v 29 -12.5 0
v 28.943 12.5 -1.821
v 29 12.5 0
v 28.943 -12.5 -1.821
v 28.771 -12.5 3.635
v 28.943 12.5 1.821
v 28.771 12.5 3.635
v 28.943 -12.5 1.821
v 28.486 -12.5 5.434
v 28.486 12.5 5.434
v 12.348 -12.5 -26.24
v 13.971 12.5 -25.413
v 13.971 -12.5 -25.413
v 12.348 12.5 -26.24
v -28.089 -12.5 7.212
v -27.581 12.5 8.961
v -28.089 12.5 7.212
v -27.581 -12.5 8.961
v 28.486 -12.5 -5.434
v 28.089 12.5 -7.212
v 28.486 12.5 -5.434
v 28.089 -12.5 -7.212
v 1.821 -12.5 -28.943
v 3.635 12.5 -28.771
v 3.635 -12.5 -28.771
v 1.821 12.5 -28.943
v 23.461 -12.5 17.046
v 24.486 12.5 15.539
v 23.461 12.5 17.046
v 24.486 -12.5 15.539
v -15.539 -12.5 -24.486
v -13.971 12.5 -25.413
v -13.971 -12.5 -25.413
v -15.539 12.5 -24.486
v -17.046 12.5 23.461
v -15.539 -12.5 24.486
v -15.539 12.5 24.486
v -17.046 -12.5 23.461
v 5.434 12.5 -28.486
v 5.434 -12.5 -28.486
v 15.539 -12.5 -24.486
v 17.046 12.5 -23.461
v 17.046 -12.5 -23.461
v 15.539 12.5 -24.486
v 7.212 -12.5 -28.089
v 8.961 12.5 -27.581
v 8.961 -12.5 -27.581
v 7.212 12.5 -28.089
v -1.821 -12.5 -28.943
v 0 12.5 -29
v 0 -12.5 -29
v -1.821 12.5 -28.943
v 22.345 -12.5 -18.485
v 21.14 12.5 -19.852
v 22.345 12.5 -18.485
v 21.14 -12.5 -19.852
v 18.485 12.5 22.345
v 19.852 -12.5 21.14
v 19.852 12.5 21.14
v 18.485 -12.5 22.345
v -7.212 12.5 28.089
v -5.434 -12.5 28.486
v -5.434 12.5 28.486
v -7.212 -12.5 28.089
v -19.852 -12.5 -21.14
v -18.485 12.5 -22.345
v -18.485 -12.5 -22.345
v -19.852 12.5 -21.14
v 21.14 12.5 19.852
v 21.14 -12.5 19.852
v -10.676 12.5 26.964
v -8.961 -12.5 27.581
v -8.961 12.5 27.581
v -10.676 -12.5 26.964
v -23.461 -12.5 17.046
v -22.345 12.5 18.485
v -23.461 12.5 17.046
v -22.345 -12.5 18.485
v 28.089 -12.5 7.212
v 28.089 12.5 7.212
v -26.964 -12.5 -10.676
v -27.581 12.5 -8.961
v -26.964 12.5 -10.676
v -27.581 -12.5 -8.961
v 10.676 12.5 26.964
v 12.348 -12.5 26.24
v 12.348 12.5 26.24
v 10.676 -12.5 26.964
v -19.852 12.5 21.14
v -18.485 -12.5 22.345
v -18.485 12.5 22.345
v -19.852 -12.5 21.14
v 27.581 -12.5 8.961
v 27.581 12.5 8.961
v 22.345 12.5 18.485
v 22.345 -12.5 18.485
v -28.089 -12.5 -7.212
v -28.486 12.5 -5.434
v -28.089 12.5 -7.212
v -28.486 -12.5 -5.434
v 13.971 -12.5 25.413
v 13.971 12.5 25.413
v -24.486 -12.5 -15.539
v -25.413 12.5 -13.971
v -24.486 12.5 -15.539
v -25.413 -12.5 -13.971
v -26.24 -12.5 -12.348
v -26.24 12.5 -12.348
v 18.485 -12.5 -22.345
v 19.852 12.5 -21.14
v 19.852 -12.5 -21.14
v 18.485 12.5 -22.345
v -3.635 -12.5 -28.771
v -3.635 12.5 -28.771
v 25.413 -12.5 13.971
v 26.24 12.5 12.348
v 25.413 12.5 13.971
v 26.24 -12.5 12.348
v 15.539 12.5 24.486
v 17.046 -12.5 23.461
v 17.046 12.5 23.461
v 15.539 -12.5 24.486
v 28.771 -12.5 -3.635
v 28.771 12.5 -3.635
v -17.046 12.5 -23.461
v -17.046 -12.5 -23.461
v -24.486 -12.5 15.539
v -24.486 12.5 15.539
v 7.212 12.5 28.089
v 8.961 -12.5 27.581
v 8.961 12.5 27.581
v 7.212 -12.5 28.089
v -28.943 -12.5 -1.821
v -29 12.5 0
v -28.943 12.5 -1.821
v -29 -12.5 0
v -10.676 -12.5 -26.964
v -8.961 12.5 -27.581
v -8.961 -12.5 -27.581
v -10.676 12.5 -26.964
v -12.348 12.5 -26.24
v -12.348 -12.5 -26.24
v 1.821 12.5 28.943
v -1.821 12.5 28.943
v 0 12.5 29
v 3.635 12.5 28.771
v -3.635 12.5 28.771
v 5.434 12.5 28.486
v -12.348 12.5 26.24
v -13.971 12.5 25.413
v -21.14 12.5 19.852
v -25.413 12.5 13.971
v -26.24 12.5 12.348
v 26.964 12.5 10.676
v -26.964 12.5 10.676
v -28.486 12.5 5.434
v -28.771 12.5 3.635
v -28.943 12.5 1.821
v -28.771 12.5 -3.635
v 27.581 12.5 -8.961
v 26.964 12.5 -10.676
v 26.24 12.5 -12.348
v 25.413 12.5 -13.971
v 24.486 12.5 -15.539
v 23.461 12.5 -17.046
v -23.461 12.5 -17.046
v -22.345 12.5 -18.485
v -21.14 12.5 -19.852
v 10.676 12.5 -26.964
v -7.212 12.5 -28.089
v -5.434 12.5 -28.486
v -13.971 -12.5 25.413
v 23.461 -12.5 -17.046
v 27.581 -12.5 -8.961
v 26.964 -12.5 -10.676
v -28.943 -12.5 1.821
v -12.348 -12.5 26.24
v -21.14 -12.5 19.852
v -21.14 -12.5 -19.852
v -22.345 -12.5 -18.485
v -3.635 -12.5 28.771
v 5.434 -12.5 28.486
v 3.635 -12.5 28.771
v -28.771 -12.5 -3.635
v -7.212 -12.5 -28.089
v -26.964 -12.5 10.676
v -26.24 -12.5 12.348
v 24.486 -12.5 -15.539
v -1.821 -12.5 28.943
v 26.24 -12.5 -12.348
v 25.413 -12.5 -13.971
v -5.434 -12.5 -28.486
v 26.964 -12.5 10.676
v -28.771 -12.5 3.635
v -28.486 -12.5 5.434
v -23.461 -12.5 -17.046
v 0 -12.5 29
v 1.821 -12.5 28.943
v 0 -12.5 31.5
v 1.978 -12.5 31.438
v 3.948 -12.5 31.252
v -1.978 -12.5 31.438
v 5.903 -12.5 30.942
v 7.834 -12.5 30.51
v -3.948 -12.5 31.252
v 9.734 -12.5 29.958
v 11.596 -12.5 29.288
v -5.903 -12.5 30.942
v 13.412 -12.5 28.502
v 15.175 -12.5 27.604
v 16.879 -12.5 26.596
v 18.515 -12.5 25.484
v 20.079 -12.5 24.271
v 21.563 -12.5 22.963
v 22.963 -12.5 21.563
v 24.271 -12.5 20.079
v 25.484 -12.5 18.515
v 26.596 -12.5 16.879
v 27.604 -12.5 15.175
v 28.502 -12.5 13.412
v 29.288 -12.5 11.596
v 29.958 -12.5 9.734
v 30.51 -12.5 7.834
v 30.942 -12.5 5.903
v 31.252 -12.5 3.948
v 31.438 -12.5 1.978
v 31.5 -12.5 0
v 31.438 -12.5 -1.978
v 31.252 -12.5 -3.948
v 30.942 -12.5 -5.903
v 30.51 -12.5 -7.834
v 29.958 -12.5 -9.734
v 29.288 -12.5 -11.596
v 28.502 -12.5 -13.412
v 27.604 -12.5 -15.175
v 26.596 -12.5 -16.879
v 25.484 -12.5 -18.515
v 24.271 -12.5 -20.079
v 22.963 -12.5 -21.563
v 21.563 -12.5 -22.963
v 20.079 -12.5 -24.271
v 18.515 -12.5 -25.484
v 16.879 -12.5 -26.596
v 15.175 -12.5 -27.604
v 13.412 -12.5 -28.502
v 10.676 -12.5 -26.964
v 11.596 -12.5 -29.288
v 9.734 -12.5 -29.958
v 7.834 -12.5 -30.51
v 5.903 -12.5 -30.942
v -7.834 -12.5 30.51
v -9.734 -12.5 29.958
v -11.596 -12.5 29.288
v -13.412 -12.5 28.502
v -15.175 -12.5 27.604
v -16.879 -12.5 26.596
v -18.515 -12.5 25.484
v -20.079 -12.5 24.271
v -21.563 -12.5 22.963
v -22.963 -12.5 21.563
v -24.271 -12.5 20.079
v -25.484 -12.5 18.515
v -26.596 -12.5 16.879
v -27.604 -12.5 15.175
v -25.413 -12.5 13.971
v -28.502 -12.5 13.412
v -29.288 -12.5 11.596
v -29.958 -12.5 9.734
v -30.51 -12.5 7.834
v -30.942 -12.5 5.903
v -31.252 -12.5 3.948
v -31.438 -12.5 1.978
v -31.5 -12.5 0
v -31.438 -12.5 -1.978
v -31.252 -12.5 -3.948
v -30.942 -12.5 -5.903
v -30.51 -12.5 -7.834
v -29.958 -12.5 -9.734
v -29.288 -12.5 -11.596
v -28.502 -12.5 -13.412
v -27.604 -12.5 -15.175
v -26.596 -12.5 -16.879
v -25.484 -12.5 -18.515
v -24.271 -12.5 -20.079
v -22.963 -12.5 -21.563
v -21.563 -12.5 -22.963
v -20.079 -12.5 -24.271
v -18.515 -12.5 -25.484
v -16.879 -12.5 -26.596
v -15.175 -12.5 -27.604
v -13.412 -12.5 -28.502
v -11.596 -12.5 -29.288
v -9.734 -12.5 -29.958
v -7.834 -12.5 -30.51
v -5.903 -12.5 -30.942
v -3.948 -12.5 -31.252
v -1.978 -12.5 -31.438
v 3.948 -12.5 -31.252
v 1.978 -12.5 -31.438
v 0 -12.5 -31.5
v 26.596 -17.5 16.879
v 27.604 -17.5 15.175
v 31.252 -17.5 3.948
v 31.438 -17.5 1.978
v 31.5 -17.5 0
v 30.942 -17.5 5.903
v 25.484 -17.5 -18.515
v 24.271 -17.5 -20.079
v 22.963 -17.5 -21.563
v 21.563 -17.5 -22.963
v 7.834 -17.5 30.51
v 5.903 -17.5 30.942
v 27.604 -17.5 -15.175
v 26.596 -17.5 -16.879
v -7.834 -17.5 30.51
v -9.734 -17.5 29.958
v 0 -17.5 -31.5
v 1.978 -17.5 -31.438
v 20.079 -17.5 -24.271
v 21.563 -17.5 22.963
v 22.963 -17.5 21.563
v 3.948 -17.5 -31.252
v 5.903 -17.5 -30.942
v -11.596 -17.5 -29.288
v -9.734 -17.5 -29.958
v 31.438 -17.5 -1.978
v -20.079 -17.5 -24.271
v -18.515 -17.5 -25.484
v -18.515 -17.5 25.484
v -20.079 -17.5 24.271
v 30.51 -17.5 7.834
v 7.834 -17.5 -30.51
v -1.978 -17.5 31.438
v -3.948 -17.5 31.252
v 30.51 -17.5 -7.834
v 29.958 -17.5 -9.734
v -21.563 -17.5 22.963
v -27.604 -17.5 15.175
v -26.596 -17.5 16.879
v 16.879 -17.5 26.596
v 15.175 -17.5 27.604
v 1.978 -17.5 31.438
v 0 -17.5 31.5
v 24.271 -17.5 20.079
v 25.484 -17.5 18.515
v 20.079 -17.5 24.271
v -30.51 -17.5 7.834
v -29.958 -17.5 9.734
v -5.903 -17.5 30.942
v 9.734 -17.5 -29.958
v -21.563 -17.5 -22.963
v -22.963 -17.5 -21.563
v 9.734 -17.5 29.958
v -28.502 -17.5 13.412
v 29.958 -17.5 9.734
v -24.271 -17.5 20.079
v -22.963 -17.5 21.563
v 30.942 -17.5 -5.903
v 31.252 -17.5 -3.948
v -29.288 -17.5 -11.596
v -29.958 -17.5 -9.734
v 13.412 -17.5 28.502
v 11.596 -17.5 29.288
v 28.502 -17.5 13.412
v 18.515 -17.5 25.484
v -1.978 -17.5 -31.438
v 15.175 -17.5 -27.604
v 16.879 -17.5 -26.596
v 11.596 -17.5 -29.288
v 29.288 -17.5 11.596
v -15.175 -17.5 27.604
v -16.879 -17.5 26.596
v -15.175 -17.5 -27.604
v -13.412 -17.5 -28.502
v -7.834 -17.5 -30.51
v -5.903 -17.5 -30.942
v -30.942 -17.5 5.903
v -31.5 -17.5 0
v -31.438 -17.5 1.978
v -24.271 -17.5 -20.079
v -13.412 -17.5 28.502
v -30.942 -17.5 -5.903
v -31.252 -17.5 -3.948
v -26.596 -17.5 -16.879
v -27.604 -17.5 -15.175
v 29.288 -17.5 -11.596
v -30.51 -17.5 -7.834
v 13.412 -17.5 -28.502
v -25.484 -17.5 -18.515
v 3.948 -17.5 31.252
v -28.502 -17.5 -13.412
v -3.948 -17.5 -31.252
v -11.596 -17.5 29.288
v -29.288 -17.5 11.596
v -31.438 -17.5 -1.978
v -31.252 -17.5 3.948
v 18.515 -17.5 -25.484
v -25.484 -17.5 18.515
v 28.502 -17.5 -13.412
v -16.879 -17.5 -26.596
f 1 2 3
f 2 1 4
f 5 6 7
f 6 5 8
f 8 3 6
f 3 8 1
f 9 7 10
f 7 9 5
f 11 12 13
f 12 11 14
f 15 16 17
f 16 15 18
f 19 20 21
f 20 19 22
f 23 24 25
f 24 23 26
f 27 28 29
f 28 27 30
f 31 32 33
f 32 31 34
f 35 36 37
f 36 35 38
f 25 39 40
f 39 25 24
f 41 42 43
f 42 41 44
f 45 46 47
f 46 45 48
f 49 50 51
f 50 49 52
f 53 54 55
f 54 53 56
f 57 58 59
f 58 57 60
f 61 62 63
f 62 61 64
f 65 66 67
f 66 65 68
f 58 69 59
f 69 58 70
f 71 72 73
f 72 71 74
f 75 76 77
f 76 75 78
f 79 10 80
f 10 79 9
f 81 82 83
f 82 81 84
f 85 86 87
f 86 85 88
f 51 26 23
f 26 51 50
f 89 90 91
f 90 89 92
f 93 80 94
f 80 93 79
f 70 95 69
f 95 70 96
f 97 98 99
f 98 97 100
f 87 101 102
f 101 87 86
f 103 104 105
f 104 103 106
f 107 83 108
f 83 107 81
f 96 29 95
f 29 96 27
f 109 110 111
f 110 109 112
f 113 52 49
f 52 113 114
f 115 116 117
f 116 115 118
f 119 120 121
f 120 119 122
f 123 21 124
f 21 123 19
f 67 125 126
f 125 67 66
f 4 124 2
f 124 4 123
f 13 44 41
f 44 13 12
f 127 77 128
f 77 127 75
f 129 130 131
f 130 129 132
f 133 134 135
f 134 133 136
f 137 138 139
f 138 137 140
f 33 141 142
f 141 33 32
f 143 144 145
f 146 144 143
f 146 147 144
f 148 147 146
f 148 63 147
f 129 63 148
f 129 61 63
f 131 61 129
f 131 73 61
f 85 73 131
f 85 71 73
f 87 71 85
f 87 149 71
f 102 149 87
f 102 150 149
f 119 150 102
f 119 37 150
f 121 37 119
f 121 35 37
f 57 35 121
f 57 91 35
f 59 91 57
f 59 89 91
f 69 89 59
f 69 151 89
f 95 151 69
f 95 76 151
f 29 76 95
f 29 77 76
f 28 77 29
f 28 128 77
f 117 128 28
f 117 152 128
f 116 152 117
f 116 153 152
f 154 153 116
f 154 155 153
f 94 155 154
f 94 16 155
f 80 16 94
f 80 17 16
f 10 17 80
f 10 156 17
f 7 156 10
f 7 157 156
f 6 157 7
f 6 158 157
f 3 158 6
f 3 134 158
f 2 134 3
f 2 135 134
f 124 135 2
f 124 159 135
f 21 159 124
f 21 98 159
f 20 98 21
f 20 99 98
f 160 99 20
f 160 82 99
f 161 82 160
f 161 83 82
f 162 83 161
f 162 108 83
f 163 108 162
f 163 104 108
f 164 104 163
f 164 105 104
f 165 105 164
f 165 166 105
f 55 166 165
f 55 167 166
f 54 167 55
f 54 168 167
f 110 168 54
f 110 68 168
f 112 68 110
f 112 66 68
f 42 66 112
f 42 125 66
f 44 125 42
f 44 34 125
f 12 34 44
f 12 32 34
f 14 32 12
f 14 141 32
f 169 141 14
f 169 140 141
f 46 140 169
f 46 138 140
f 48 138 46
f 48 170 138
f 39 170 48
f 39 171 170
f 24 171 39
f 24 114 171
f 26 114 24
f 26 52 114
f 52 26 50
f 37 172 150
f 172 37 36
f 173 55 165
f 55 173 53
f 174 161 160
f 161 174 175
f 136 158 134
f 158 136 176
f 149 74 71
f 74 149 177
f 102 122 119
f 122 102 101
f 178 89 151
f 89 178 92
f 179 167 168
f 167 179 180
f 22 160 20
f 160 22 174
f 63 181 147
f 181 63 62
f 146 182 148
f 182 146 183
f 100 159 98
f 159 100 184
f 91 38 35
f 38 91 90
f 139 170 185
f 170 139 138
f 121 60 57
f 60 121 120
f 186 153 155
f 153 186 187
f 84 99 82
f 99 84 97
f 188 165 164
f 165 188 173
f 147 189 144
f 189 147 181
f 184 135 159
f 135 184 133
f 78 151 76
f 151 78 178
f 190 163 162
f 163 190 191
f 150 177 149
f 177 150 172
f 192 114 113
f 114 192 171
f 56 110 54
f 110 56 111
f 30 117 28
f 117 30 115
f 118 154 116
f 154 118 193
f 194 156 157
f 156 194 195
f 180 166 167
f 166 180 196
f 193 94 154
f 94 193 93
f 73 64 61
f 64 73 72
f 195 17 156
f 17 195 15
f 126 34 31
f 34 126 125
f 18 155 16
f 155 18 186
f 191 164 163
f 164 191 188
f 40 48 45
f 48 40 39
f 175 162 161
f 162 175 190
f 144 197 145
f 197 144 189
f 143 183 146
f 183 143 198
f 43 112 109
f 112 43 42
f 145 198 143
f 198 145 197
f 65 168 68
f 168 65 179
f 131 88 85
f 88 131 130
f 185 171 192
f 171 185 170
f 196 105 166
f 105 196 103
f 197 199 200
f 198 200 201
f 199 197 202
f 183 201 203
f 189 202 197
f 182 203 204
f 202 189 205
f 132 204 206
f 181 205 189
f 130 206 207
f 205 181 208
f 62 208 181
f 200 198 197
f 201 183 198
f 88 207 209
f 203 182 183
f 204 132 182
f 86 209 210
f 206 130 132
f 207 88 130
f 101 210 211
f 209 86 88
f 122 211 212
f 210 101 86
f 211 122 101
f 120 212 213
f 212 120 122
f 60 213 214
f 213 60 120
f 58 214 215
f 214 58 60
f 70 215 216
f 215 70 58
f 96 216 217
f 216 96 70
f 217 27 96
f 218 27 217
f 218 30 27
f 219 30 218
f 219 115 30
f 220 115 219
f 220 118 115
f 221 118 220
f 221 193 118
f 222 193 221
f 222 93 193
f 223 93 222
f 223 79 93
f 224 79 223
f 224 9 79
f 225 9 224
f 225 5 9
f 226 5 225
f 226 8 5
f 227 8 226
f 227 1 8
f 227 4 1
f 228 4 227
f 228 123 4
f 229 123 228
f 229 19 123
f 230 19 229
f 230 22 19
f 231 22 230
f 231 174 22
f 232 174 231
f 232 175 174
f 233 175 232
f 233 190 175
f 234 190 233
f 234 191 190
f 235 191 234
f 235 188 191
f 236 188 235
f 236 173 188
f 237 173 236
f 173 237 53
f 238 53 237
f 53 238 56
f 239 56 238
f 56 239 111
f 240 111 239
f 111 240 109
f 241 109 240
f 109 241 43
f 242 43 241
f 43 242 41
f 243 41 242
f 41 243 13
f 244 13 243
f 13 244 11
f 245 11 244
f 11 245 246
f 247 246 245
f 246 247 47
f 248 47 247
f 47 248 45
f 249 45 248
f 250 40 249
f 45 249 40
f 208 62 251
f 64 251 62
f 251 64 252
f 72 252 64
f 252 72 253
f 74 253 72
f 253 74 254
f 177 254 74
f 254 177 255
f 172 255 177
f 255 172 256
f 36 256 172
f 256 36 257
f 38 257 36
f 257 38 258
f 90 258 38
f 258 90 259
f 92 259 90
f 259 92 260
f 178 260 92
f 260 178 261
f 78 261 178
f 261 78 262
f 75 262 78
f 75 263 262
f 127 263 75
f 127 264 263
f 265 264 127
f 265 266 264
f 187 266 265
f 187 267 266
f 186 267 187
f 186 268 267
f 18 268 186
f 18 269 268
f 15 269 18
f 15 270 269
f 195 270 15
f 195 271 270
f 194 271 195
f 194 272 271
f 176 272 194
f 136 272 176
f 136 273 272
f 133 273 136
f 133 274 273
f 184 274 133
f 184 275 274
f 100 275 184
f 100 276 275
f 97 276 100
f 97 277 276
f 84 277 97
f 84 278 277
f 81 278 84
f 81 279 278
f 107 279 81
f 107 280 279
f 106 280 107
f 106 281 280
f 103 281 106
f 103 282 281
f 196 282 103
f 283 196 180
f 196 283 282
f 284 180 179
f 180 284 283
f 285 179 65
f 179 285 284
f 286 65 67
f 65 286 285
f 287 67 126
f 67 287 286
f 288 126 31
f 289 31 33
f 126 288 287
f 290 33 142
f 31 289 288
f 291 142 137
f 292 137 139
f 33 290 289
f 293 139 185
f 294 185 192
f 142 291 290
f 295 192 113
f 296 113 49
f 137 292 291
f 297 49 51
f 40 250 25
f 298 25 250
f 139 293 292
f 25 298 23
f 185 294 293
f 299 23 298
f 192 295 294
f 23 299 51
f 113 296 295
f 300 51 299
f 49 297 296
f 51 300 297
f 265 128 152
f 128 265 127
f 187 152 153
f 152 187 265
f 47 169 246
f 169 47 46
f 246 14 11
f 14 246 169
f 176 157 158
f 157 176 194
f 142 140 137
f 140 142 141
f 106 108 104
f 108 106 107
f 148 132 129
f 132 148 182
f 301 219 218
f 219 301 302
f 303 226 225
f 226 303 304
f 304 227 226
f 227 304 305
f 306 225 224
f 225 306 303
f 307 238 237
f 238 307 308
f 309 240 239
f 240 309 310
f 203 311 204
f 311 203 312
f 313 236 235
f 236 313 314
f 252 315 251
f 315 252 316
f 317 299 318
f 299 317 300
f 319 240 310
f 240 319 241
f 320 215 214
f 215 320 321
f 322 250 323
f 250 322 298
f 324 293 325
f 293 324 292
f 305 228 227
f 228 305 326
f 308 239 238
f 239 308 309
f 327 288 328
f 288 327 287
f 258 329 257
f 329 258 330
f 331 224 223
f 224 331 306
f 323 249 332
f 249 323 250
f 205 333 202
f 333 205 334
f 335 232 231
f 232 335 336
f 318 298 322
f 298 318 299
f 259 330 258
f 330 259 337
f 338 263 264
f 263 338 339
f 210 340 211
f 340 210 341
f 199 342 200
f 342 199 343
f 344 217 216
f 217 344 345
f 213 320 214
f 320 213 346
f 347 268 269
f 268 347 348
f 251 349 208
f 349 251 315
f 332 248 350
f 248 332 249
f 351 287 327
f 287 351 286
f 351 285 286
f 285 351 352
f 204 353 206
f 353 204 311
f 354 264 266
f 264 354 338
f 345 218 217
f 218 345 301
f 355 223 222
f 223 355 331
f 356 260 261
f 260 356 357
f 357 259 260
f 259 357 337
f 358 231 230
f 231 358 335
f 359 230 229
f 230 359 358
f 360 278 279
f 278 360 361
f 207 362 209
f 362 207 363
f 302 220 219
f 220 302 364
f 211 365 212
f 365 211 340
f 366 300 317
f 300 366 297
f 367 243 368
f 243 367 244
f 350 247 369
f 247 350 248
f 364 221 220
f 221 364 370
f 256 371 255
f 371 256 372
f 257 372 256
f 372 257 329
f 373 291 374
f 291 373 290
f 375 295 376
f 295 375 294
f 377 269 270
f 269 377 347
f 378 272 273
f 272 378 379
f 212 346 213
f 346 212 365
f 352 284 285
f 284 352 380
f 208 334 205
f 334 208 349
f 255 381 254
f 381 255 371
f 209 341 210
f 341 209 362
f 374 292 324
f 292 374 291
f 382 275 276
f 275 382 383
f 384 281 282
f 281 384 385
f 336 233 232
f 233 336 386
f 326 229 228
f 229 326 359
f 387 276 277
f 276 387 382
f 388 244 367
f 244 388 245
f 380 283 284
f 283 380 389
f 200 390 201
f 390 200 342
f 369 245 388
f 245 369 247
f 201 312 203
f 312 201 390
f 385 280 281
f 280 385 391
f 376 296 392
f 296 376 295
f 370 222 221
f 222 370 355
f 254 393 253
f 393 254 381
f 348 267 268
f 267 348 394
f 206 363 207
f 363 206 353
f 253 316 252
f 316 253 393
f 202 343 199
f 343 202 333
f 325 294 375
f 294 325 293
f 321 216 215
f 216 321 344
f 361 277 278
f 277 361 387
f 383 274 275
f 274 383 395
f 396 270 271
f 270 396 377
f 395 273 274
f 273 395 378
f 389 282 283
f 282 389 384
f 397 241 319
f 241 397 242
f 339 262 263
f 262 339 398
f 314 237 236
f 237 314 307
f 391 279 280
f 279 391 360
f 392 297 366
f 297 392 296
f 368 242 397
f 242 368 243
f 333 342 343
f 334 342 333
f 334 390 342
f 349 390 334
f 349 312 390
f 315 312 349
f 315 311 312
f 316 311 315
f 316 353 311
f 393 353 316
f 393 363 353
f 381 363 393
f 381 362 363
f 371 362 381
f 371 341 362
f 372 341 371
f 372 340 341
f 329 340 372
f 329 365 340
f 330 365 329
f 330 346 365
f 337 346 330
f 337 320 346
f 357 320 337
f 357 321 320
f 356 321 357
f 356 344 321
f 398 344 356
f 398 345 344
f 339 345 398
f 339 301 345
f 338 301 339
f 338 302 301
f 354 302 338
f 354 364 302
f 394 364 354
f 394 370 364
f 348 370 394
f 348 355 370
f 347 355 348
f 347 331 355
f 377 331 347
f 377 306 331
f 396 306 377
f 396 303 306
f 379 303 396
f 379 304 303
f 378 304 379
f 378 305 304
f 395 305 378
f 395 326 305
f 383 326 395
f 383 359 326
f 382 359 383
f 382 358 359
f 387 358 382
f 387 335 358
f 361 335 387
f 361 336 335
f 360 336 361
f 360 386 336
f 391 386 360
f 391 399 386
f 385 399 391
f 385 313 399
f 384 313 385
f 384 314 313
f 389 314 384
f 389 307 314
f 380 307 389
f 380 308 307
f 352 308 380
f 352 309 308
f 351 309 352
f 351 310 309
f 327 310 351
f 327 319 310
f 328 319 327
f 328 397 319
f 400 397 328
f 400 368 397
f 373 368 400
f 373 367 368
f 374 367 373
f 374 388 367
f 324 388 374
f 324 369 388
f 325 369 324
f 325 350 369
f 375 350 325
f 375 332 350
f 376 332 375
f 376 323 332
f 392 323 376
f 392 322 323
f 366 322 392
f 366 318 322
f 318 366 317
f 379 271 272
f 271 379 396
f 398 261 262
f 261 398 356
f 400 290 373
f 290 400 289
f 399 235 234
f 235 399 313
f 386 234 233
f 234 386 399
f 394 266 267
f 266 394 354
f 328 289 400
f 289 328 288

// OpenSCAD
$fn = 100;
rotate(a = 90, v = [1, 0, 0])
{
  union()
  {
    cylinder(h = 25, r = 29, center = true);
    translate(v = [0, 0, 15])
    {
      cylinder(h = 5, r = 31.5, center = true);
    }
  }
}
